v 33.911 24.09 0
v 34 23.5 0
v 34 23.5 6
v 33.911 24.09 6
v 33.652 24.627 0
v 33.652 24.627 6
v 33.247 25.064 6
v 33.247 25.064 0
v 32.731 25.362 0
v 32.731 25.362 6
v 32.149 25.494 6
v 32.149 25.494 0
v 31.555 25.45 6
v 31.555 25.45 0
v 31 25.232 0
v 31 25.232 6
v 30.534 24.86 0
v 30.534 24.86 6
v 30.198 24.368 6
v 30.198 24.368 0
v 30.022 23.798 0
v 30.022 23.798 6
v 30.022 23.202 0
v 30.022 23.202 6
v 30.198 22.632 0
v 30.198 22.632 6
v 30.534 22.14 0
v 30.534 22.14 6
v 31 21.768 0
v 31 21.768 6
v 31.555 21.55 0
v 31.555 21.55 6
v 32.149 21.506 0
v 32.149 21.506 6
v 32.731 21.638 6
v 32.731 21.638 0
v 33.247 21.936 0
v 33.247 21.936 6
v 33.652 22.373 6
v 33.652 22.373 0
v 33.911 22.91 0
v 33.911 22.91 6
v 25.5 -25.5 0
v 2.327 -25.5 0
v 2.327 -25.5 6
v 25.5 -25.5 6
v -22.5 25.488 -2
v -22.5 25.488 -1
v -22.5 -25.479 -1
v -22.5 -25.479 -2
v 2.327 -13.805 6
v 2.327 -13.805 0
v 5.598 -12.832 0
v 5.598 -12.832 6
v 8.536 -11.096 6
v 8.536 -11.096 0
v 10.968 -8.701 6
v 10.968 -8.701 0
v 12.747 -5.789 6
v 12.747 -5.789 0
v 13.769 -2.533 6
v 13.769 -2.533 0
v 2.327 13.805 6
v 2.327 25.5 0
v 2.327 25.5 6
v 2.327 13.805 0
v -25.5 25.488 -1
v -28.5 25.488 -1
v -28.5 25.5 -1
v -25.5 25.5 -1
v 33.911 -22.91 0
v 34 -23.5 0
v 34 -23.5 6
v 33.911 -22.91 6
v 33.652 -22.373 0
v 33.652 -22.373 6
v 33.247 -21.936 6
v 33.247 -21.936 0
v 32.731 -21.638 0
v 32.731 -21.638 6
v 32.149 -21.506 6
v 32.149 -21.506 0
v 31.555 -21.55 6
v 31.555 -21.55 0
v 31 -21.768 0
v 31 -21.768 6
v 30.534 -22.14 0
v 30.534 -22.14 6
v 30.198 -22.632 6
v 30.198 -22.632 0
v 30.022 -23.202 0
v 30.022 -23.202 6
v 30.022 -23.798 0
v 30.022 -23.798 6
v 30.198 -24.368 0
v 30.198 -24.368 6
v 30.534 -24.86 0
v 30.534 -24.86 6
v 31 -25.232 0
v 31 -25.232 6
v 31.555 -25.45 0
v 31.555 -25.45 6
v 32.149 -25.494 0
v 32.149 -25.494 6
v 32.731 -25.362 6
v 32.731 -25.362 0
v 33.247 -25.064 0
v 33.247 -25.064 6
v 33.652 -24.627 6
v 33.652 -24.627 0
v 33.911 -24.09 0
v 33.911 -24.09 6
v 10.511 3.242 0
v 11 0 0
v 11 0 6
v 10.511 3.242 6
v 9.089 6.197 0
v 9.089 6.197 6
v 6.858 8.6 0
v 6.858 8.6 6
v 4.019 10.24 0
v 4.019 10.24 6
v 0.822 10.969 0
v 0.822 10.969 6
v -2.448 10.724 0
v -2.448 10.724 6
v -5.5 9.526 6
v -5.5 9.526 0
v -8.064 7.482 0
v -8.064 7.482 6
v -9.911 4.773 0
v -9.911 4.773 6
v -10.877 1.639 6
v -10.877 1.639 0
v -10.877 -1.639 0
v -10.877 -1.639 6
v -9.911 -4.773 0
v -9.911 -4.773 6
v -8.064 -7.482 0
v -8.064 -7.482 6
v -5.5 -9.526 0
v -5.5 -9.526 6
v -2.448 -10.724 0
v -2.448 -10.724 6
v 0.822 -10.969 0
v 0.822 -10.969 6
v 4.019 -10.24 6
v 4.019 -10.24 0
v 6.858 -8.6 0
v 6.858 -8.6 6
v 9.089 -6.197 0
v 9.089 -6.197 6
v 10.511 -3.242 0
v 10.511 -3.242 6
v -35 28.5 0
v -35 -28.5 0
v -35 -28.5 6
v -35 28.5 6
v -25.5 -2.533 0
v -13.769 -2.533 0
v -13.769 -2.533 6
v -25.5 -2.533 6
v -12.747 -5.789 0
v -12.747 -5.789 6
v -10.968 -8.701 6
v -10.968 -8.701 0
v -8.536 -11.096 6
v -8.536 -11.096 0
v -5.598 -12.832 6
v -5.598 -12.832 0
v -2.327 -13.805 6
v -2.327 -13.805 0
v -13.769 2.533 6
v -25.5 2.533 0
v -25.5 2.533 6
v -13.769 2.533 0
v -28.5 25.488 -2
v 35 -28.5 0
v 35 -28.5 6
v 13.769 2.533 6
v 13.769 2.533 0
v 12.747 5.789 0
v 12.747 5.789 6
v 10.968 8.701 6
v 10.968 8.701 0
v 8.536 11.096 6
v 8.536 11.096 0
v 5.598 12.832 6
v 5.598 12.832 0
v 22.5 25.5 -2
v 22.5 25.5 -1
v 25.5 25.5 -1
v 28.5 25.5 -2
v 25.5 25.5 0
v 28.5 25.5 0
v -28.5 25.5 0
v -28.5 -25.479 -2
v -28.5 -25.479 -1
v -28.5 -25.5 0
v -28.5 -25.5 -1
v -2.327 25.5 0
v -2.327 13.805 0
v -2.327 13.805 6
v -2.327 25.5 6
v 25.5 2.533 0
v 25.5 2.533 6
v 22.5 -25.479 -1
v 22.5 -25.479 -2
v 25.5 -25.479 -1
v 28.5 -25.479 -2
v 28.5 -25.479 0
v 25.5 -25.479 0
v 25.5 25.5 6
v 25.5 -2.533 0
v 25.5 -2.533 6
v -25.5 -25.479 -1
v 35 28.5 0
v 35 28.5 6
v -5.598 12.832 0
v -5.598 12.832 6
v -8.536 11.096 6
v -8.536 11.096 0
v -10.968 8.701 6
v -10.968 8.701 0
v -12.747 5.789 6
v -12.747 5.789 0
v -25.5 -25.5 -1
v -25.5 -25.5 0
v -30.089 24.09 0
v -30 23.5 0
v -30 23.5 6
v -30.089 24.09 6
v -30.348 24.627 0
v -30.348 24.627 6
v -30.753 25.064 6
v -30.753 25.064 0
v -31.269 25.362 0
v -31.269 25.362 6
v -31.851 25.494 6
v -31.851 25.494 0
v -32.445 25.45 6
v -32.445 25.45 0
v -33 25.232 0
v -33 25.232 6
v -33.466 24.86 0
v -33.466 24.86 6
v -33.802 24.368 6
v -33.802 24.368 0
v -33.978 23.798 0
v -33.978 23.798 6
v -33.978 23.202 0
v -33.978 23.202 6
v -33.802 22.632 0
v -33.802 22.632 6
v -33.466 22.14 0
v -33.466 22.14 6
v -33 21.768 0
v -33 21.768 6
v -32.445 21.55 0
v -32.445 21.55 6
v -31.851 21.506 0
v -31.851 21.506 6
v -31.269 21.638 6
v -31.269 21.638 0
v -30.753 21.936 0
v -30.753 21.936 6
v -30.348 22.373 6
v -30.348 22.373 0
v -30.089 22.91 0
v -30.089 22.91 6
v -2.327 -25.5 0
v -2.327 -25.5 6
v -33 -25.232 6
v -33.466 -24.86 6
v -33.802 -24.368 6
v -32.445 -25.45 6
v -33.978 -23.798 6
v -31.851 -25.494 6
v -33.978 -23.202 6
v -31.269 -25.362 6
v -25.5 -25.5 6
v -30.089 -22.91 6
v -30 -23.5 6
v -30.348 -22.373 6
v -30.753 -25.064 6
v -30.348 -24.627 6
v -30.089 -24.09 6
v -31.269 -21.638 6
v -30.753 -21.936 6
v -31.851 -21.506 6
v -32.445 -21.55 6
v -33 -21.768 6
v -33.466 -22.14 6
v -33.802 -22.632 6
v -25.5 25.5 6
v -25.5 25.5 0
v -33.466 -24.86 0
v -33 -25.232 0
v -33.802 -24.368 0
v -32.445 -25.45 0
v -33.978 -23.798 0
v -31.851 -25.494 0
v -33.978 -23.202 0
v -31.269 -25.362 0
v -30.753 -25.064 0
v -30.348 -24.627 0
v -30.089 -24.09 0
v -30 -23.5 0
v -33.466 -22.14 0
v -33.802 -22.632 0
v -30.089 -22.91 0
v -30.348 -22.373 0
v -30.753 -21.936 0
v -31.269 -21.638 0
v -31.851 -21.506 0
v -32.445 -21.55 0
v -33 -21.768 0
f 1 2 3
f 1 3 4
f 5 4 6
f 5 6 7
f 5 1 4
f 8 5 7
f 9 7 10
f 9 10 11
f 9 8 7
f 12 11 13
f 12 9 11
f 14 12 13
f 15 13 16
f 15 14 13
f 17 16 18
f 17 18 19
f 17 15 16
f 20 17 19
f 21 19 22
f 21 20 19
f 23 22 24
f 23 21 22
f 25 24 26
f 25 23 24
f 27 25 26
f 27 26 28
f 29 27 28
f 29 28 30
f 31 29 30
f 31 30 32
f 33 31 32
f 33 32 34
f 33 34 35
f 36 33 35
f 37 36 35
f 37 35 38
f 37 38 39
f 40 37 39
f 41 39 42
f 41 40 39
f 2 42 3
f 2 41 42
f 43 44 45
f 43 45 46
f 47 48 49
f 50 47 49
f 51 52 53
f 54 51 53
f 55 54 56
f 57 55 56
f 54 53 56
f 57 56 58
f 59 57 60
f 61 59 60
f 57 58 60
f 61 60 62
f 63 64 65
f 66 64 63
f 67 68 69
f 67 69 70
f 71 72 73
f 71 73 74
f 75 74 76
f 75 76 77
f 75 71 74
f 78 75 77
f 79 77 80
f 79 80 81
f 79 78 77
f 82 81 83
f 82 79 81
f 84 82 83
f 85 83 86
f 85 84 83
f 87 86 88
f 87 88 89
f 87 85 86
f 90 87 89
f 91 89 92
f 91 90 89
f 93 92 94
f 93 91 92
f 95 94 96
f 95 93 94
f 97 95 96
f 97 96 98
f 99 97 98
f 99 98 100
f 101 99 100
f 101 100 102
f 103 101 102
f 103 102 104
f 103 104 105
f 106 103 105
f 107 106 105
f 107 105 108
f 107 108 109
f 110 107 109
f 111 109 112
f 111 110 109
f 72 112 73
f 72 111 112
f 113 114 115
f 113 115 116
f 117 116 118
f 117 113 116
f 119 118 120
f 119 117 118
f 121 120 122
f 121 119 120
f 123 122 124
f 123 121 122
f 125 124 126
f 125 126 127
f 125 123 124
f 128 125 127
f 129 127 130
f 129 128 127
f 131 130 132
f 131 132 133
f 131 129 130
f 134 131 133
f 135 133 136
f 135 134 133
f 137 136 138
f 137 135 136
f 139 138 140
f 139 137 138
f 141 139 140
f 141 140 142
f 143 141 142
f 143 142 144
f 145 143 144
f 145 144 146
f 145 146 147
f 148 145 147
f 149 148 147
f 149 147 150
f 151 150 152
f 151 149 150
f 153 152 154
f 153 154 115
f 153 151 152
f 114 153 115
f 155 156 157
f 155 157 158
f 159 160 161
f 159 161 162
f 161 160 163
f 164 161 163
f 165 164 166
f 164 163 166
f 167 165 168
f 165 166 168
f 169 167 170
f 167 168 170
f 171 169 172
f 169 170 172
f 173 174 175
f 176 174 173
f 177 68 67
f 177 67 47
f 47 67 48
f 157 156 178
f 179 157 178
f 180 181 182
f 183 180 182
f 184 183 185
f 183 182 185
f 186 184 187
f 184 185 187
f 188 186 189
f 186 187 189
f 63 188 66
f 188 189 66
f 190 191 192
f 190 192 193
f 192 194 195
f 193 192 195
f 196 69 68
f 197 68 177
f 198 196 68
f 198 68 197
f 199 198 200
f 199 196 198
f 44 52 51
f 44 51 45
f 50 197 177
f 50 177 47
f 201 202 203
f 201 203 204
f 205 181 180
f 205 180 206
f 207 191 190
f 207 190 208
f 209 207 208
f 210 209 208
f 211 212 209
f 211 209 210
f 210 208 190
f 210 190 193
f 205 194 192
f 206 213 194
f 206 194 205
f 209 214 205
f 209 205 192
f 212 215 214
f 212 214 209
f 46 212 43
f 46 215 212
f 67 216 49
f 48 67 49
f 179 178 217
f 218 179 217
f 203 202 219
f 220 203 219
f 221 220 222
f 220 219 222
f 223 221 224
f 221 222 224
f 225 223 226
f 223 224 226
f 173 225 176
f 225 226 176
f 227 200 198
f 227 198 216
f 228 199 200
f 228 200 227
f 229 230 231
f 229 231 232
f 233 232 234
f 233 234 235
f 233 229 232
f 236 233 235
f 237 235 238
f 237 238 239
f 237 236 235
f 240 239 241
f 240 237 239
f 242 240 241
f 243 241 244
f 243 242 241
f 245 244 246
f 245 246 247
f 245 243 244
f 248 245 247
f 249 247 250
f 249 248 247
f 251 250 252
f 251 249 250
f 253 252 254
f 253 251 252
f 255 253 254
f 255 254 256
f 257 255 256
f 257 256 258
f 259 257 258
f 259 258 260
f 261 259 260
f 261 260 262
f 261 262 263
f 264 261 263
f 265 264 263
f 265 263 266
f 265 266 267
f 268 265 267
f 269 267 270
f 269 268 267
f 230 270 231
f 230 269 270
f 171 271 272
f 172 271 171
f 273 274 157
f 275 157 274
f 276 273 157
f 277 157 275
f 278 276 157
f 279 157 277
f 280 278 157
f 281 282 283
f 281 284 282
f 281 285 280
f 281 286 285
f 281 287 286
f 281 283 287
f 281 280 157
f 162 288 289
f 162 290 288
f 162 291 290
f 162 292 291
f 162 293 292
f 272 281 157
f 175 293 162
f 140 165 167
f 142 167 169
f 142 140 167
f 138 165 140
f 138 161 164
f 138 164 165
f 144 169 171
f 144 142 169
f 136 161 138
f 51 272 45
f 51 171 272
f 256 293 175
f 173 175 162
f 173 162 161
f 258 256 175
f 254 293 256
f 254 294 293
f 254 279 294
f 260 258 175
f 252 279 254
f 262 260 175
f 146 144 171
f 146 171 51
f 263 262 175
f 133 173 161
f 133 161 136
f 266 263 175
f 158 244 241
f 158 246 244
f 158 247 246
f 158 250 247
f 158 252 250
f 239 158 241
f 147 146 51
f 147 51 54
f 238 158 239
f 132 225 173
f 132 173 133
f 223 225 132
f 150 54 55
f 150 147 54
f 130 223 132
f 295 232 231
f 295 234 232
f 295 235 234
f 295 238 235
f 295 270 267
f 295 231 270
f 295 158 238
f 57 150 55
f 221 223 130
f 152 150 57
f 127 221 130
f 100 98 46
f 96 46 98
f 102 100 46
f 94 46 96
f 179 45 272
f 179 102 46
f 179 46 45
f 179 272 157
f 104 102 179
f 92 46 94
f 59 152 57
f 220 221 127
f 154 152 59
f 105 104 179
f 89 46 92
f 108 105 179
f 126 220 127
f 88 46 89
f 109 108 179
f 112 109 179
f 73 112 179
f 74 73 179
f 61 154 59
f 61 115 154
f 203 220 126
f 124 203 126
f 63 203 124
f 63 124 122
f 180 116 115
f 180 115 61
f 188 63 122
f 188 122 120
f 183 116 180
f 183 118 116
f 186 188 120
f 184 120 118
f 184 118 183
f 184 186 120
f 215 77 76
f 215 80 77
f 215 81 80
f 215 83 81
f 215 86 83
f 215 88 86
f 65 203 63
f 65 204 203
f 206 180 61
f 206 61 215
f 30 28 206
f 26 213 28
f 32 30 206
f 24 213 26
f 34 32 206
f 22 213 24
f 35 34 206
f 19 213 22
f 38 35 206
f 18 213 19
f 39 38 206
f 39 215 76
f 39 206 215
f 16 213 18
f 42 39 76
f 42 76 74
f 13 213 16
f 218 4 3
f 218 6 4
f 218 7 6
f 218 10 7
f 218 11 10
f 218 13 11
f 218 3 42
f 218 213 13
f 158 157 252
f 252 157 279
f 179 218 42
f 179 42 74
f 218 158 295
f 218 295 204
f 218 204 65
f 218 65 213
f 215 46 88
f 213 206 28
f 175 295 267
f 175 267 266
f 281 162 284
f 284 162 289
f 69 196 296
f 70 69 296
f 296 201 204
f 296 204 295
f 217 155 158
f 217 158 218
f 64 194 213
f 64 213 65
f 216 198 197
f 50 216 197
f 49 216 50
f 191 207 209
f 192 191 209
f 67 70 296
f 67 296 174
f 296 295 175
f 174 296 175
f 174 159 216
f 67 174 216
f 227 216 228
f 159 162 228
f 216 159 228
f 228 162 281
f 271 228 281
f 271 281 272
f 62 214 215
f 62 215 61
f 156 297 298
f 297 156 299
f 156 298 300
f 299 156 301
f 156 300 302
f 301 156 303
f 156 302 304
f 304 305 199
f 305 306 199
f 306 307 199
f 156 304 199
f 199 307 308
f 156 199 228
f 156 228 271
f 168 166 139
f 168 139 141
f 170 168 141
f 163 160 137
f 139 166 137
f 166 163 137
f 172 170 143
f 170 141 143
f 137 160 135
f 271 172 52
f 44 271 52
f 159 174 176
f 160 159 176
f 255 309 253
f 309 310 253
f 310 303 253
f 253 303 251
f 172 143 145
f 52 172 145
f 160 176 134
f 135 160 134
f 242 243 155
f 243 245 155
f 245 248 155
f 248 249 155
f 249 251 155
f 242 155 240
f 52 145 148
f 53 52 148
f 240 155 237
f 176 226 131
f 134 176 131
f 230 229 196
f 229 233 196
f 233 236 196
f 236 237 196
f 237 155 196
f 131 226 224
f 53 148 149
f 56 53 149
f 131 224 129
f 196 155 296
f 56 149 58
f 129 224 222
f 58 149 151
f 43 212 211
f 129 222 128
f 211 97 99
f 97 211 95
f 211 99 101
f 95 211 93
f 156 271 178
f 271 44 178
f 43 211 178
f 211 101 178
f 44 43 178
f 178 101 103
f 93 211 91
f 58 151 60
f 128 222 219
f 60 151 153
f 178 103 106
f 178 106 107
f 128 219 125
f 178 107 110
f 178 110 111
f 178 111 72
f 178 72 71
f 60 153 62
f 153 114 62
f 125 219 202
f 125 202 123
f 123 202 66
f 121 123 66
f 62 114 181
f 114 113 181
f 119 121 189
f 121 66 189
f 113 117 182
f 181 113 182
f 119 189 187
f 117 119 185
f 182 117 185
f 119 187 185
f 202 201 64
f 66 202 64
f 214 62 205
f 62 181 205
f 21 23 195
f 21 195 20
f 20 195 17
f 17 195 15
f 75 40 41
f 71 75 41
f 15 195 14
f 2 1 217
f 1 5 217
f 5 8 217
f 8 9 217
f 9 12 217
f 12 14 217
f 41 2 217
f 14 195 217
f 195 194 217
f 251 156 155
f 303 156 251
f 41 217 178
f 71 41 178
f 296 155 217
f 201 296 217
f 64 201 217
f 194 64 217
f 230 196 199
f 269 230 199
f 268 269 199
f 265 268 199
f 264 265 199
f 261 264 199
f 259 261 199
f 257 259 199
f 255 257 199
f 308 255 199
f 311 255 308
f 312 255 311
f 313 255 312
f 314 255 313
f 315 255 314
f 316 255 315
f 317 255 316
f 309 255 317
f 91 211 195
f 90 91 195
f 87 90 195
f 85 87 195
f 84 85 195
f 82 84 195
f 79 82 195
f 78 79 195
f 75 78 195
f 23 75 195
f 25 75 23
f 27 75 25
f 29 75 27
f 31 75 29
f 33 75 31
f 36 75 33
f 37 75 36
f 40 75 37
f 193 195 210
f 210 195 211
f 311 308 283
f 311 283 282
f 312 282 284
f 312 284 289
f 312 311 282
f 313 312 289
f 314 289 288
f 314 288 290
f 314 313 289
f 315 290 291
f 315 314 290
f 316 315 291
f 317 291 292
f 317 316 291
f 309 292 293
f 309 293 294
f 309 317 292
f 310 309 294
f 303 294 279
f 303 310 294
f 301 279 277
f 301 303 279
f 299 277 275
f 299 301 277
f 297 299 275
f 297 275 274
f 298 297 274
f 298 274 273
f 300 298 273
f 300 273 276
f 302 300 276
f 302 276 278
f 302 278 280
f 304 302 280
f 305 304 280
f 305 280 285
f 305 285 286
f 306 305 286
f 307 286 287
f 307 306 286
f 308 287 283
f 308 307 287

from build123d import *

# Parameters (mm, degrees)
F0_R      = 14
F0_R_2    = 11
F1_DEPTH  = 6
F2_W      = 57
F2_H      = 57
F3_DEPTH  = 6
F5_W      = 3
F5_H      = 50.979116
F5_H_2    = 51
F6_DEPTH  = 1
F7_W      = 6
F7_H      = 50.96702
F7_W_2    = 3
F7_H_2    = 50.979116
F8_DEPTH  = 1
F9_W      = 6.5
F9_H      = 57
F9_R      = 2
F10_DEPTH = 6


with BuildPart() as f1:
    # F0 (on Top) → F1 (new body)
    with BuildSketch(Plane.XY):
        Circle(F0_R)
        Circle(F0_R_2, mode=Mode.SUBTRACT)
    extrude(amount=F1_DEPTH)


with BuildPart() as f3:
    # F2 (on face) → F3 (new body)
    with BuildSketch(Plane(origin=(0, 0, 0), x_dir=(1, 0, 0), z_dir=(0, 0, -1))):
        Rectangle(F2_W, F2_H)
        Polygon((25.5, -2.533051), (25.5, -25.5), (2.32699, -25.5), (-2.32699, -25.5), (-25.5, -25.5), (-25.5, -2.533051), (-25.5, 2.533051), (-25.5, 25.5), (-2.32699, 25.5), (2.32699, 25.5), (25.5, 25.5), (25.5, 2.533051), align=None, mode=Mode.SUBTRACT)
        with BuildLine():
            Line((2.32699, 13.805257), (2.32699, 25.5))
            Line((2.32699, 25.5), (-2.32699, 25.5))
            Line((-2.32699, 25.5), (-2.32699, 13.805257))
            ThreePointArc((-2.32699, 13.805257), (0, 14), (2.32699, 13.805257))
        make_face()
        with BuildLine():
            Line((-25.5, 2.533051), (-25.5, -2.533051))
            Line((-25.5, -2.533051), (-13.768938, -2.533051))
            ThreePointArc((-13.768938, -2.533051), (-14, 0), (-13.768938, 2.533051))
            Line((-13.768938, 2.533051), (-25.5, 2.533051))
        make_face()
        with BuildLine():
            Line((-2.32699, -25.5), (2.32699, -25.5))
            Line((2.32699, -25.5), (2.32699, -13.805257))
            ThreePointArc((2.32699, -13.805257), (0, -14), (-2.32699, -13.805257))
            Line((-2.32699, -13.805257), (-2.32699, -25.5))
        make_face()
        with BuildLine():
            Line((13.768938, -2.533051), (25.5, -2.533051))
            Line((25.5, -2.533051), (25.5, 2.533051))
            Line((25.5, 2.533051), (13.768938, 2.533051))
            ThreePointArc((13.768938, 2.533051), (13.942115, 1.271784), (14, 0))
            ThreePointArc((14, 0), (13.942115, -1.271784), (13.768938, -2.533051))
        make_face()
    extrude(amount=-F3_DEPTH)


with BuildPart() as f1_1:
    add(f1.part)

    # F4: union F3
    add(f3.part)

    # F5 (on face) → F6 (join)
    with BuildSketch(Plane(origin=(0, 0, 0), x_dir=(1, 0, 0), z_dir=(0, 0, -1))):
        with Locations((27, -0.010442)):
            Rectangle(F5_W, F5_H)
        with Locations((-27, 0)):
            Rectangle(F5_W, F5_H_2)
    extrude(amount=F6_DEPTH)

    # F7 (on face) → F8 (join)
    with BuildSketch(Plane(origin=(0, 0, -1), x_dir=(1, 0, 0), z_dir=(0, 0, -1))):
        with Locations((-25.5, -0.004394)):
            Rectangle(F7_W, F7_H)
        with Locations((24, -0.010442)):
            Rectangle(F7_W_2, F7_H_2)
        with Locations((27, -0.010442)):
            Rectangle(F7_W_2, F7_H_2)
    extrude(amount=F8_DEPTH)

    # F9 (on Top) → F10 (join)
    with BuildSketch(Plane.XY):
        with Locations((-31.75, 0)):
            Rectangle(F9_W, F9_H)
        with Locations((-32, -23.5)):
            Circle(F9_R, mode=Mode.SUBTRACT)
        with Locations((-32, 23.5)):
            Circle(F9_R, mode=Mode.SUBTRACT)
        with Locations((31.75, 0)):
            Rectangle(F9_W, F9_H)
        with Locations((32, -23.5)):
            Circle(F9_R, mode=Mode.SUBTRACT)
        with Locations((32, 23.5)):
            Circle(F9_R, mode=Mode.SUBTRACT)
    extrude(amount=F10_DEPTH)


solid = f1_1.part
